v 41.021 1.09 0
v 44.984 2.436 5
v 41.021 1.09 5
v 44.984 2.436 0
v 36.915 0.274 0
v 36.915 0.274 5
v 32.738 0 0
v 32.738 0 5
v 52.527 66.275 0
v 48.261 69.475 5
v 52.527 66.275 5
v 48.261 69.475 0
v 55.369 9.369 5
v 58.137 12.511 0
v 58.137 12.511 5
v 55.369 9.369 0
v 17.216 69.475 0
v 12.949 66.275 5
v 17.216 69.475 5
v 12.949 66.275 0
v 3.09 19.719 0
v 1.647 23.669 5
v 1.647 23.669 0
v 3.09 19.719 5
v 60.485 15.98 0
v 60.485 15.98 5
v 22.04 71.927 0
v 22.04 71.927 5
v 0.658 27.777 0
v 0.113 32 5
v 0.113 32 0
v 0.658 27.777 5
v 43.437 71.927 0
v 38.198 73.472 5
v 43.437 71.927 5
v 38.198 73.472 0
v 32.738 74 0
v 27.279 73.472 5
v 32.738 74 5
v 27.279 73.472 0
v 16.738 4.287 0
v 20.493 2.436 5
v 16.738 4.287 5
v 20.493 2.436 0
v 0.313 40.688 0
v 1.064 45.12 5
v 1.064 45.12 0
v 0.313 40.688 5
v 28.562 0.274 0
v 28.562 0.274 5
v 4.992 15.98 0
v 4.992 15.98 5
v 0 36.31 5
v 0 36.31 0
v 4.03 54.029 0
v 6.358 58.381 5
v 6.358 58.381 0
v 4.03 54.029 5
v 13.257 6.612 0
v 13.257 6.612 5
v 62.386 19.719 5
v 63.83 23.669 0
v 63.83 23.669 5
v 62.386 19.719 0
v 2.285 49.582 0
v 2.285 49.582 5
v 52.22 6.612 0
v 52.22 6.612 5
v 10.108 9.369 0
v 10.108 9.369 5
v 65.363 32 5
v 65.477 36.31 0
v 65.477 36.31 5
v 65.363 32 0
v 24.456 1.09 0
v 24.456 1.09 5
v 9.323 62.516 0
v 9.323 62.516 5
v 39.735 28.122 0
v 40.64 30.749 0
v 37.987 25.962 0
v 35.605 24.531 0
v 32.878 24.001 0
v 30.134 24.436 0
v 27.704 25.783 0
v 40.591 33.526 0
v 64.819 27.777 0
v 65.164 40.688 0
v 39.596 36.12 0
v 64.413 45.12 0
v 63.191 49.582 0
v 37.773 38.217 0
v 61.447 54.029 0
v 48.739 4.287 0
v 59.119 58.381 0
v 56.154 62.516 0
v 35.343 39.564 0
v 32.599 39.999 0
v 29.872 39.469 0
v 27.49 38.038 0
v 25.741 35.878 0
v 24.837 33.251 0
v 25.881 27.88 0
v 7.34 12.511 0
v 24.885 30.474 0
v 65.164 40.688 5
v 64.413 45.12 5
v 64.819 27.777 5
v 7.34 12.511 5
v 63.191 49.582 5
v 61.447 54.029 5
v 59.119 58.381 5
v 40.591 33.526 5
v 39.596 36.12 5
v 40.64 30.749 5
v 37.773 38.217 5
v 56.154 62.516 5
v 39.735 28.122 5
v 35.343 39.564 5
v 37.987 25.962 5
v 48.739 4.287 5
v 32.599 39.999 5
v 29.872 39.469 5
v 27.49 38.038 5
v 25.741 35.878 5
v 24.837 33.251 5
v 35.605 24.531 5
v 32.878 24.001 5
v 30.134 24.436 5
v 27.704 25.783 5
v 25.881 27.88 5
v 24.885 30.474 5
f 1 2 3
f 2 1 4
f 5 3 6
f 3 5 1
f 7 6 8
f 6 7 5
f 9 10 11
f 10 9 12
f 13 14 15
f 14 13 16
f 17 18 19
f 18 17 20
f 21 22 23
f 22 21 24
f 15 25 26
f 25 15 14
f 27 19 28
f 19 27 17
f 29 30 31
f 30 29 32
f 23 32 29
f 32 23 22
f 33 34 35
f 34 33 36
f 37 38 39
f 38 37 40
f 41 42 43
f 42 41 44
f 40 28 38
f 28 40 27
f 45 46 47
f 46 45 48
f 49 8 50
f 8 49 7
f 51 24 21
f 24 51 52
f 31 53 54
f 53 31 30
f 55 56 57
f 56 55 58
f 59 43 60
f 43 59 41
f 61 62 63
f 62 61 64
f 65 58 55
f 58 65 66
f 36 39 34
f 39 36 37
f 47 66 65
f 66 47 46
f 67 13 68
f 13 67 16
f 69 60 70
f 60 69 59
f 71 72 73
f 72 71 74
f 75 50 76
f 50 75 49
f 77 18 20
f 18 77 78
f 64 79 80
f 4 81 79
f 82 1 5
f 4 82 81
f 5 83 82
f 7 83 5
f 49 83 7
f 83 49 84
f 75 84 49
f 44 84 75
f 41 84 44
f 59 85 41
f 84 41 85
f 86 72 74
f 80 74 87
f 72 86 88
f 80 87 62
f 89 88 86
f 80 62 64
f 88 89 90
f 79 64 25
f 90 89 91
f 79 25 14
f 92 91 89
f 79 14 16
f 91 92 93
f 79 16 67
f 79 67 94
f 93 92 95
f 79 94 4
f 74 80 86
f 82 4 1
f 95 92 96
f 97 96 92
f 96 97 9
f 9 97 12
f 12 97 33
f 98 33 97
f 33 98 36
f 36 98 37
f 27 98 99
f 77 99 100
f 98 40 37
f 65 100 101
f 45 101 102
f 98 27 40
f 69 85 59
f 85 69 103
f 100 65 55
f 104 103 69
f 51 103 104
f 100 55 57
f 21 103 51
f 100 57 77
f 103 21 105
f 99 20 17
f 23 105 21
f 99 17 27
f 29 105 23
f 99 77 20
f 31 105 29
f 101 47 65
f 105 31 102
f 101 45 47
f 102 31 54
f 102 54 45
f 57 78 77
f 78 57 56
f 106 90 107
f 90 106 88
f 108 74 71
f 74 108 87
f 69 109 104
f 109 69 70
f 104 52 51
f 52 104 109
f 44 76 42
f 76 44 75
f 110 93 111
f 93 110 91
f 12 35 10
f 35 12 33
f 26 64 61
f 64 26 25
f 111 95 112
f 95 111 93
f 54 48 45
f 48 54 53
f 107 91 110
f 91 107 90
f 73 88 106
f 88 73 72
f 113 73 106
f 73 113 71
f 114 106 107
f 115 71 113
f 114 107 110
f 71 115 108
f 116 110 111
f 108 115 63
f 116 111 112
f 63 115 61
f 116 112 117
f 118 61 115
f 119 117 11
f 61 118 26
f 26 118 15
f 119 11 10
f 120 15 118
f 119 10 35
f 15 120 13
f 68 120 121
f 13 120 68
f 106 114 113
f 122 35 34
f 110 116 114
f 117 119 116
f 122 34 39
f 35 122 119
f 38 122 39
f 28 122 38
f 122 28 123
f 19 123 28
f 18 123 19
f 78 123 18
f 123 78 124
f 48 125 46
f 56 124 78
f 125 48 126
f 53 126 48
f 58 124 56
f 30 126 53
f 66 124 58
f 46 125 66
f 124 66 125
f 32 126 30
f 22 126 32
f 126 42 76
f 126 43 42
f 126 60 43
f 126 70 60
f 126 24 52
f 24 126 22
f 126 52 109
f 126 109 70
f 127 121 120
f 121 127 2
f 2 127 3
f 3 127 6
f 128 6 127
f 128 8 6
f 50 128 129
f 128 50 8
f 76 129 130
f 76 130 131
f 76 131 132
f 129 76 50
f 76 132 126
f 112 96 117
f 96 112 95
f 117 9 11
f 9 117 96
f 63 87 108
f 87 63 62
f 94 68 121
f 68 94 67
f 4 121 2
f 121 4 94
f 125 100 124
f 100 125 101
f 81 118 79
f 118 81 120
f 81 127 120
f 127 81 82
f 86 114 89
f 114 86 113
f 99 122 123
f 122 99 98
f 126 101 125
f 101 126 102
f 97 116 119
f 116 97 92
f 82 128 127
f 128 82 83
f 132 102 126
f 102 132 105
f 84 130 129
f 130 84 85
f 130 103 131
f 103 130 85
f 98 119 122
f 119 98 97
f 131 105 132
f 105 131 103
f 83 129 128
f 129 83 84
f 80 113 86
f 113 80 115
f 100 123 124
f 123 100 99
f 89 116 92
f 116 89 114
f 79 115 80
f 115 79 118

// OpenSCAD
$fn = 32;

// ----------------------------------------------------------------------
// Cam plate: single_lobe cam, base R32
// ----------------------------------------------------------------------

// --- parameters (mm) ---
base_r = 32;              // base circle radius
lobe_h = 10;              // cam lobe rise
bore_r = 8;               // shaft bore radius
plate_t = 5;              // plate thickness, Z (extrusion height)

profile = [[65.363, 32], [65.477, 36.31], [65.164, 40.688], [64.413, 45.12], [63.191, 49.582], [61.447, 54.029], [59.119, 58.381], [56.154, 62.516], [52.527, 66.275], [48.261, 69.475], [43.437, 71.927], [38.198, 73.472], [32.738, 74], [27.279, 73.472], [22.04, 71.927], [17.216, 69.475], [12.949, 66.275], [9.323, 62.516], [6.358, 58.381], [4.03, 54.029], [2.285, 49.582], [1.064, 45.12], [0.313, 40.688], [0, 36.31], [0.113, 32], [0.658, 27.777], [1.647, 23.669], [3.09, 19.719], [4.992, 15.98], [7.34, 12.511], [10.108, 9.369], [13.257, 6.612], [16.738, 4.287], [20.493, 2.436], [24.456, 1.09], [28.562, 0.274], [32.738, 0], [36.915, 0.274], [41.021, 1.09], [44.984, 2.436], [48.739, 4.287], [52.22, 6.612], [55.369, 9.369], [58.137, 12.511], [60.485, 15.98], [62.386, 19.719], [63.83, 23.669], [64.819, 27.777]];  // primary outline, 48 points, counter clockwise
void_1 = [[40.591, 33.526], [39.596, 36.12], [37.773, 38.217], [35.343, 39.564], [32.599, 39.999], [29.872, 39.469], [27.49, 38.038], [25.741, 35.878], [24.837, 33.251], [24.885, 30.474], [25.881, 27.88], [27.704, 25.783], [30.134, 24.436], [32.878, 24.001], [35.605, 24.531], [37.987, 25.962], [39.735, 28.122], [40.64, 30.749]];  // shaft bore, 18 points

// --- the one profile operation ---
difference() {
  linear_extrude(height = plate_t) polygon(points = profile);
  translate([0, 0, -1])
    linear_extrude(height = plate_t + 2) polygon(points = void_1);
}
